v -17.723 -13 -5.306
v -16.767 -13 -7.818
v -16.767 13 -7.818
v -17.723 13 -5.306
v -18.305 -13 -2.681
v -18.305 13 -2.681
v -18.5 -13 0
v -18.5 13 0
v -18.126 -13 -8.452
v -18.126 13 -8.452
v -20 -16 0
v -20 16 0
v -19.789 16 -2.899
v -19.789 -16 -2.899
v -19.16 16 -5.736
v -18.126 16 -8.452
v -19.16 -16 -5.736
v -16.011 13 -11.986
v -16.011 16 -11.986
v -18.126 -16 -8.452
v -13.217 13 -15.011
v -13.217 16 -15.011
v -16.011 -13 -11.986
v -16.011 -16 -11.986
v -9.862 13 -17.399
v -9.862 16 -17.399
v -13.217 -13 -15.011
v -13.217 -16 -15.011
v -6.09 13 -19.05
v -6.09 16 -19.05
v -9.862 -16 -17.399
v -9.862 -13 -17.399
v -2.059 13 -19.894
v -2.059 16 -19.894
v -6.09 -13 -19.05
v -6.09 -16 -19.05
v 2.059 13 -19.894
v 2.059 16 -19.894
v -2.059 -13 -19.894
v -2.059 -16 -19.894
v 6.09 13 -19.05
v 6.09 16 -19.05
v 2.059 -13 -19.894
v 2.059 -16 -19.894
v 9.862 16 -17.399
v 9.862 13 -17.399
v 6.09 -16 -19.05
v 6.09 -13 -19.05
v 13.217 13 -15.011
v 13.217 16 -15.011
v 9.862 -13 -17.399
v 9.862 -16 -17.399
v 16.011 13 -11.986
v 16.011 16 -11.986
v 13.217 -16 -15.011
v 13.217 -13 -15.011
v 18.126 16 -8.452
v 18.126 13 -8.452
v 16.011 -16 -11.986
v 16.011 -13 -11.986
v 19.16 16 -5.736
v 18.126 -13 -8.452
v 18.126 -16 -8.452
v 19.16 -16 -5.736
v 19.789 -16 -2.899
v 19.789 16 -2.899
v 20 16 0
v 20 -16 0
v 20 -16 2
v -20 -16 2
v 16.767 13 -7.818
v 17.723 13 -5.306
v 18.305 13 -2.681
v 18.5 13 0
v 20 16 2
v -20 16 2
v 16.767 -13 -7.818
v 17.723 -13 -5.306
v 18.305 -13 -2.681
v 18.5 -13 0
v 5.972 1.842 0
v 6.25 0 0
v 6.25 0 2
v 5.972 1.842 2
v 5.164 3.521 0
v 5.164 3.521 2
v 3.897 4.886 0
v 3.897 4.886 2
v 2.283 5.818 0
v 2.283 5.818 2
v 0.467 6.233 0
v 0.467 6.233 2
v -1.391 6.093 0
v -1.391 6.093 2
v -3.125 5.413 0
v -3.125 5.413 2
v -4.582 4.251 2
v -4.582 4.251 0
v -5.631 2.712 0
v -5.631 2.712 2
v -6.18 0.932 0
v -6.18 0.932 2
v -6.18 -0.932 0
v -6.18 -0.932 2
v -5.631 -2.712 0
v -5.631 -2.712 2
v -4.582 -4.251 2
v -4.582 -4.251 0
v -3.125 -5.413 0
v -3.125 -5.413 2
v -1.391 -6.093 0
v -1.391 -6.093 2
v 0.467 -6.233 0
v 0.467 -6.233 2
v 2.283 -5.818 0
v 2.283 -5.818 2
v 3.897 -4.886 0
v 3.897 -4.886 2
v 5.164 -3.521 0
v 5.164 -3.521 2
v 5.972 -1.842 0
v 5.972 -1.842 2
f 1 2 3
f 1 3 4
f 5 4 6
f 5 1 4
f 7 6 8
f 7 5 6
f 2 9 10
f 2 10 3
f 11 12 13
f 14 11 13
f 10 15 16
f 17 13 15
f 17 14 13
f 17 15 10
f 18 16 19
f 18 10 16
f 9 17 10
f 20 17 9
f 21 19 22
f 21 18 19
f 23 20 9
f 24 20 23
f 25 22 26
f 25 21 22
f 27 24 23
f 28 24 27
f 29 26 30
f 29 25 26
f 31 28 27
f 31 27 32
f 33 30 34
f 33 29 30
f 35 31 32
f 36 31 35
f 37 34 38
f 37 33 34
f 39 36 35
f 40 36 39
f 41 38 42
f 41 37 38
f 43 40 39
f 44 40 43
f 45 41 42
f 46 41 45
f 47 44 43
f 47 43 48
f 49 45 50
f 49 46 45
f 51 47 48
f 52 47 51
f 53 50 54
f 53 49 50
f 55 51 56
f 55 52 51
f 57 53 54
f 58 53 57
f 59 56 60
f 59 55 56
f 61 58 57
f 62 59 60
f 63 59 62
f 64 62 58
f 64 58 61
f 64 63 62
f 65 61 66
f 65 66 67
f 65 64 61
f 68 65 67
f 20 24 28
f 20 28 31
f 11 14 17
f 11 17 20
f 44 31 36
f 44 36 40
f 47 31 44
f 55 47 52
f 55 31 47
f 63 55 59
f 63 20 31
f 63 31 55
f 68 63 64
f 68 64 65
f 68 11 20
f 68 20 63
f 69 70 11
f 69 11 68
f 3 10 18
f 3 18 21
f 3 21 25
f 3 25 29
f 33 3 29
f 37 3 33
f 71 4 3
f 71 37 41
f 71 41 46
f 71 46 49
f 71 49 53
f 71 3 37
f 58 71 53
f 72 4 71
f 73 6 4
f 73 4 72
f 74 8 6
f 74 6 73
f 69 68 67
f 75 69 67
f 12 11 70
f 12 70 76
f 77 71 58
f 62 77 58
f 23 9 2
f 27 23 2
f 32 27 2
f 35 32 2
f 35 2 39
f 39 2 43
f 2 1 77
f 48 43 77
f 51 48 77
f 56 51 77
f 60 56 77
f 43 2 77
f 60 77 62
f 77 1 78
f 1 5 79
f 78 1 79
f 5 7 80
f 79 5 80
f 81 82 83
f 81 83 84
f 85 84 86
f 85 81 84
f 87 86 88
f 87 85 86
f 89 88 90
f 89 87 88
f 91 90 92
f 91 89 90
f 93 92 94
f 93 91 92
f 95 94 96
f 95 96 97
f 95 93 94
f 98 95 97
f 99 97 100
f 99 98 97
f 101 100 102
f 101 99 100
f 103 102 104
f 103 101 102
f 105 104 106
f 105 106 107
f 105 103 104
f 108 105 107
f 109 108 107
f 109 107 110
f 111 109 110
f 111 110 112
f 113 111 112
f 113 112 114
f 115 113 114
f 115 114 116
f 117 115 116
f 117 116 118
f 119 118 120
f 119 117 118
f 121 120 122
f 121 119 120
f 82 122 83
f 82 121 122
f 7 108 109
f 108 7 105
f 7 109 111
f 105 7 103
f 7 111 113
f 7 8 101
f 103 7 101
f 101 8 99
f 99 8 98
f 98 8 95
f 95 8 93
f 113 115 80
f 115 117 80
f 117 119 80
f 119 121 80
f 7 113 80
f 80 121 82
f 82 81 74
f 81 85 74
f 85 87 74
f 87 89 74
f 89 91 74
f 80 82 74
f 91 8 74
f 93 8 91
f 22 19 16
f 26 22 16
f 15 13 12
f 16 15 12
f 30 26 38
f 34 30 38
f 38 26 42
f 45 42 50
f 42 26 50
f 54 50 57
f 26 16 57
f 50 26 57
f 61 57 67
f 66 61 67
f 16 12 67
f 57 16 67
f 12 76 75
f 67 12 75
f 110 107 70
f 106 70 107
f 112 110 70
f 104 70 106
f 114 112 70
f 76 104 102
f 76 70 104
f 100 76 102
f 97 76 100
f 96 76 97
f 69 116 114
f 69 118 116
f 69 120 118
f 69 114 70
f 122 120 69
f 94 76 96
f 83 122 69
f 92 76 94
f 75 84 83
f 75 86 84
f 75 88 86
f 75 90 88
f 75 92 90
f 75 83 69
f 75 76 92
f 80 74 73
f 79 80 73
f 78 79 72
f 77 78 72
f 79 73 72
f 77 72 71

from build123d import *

# Parameters (mm, degrees)
F0_W     = 40
F0_H     = 32
F0_R     = 6.25
F1_DEPTH = 2
F3_START = 13
F3_DEPTH = 3
F4_START = -13
F4_DEPTH = 3
F5_DEPTH = 16


with BuildPart() as f1:
    # F0 (on Top) → F1 (new body)
    with BuildSketch(Plane.XY):
        Rectangle(F0_W, F0_H)
        Circle(F0_R, mode=Mode.SUBTRACT)
    extrude(amount=F1_DEPTH)

    # F2 (on Front) → F3 (join)
    with BuildSketch(Plane.XZ.offset(F3_START)):
        with BuildLine():
            ThreePointArc((18.1261557407, -8.4523652348), (19.5259201424, -4.3287922788), (20, 0))
            Line((20, 0), (18.5, 0))
            ThreePointArc((18.5, 0), (18.0614761317, -4.0041328579), (16.7666940602, -7.8184378422))
            Line((16.7666940602, -7.8184378422), (18.1261557407, -8.4523652348))
        make_face()
        with BuildLine():
            Line((-18.5, 0), (-20, 0))
            ThreePointArc((-20, 0), (-19.5259201424, -4.3287922788), (-18.1261557407, -8.4523652348))
            Line((-18.1261557407, -8.4523652348), (-16.7666940602, -7.8184378422))
            ThreePointArc((-16.7666940602, -7.8184378422), (-18.0614761317, -4.0041328579), (-18.5, 0))
        make_face()
        with BuildLine():
            ThreePointArc((-18.1261557407, -8.4523652348), (0, -20), (18.1261557407, -8.4523652348))
            Line((18.1261557407, -8.4523652348), (16.7666940602, -7.8184378422))
            ThreePointArc((16.7666940602, -7.8184378422), (0, -18.5), (-16.7666940602, -7.8184378422))
            Line((-16.7666940602, -7.8184378422), (-18.1261557407, -8.4523652348))
        make_face()
        with BuildLine():
            ThreePointArc((16.7666940602, -7.8184378422), (18.0614761317, -4.0041328579), (18.5, 0))
            Line((18.5, 0), (0, 0))
            Line((0, 0), (16.7666940602, -7.8184378422))
        make_face()
        with BuildLine():
            Line((0, 0), (-18.5, 0))
            ThreePointArc((-18.5, 0), (-18.0614761317, -4.0041328579), (-16.7666940602, -7.8184378422))
            Line((-16.7666940602, -7.8184378422), (0, 0))
        make_face()
        with BuildLine():
            ThreePointArc((-16.7666940602, -7.8184378422), (0, -18.5), (16.7666940602, -7.8184378422))
            Line((16.7666940602, -7.8184378422), (0, 0))
            Line((0, 0), (-16.7666940602, -7.8184378422))
        make_face()
    extrude(amount=F3_DEPTH)

    # F2 (on Front) → F4 (join)
    with BuildSketch(Plane.XZ.offset(F4_START)):
        with BuildLine():
            ThreePointArc((18.1261557407, -8.4523652348), (19.5259201424, -4.3287922788), (20, 0))
            Line((20, 0), (18.5, 0))
            ThreePointArc((18.5, 0), (18.0614761317, -4.0041328579), (16.7666940602, -7.8184378422))
            Line((16.7666940602, -7.8184378422), (18.1261557407, -8.4523652348))
        make_face()
        with BuildLine():
            Line((-18.5, 0), (-20, 0))
            ThreePointArc((-20, 0), (-19.5259201424, -4.3287922788), (-18.1261557407, -8.4523652348))
            Line((-18.1261557407, -8.4523652348), (-16.7666940602, -7.8184378422))
            ThreePointArc((-16.7666940602, -7.8184378422), (-18.0614761317, -4.0041328579), (-18.5, 0))
        make_face()
        with BuildLine():
            ThreePointArc((-18.1261557407, -8.4523652348), (0, -20), (18.1261557407, -8.4523652348))
            Line((18.1261557407, -8.4523652348), (16.7666940602, -7.8184378422))
            ThreePointArc((16.7666940602, -7.8184378422), (0, -18.5), (-16.7666940602, -7.8184378422))
            Line((-16.7666940602, -7.8184378422), (-18.1261557407, -8.4523652348))
        make_face()
        with BuildLine():
            ThreePointArc((16.7666940602, -7.8184378422), (18.0614761317, -4.0041328579), (18.5, 0))
            Line((18.5, 0), (0, 0))
            Line((0, 0), (16.7666940602, -7.8184378422))
        make_face()
        with BuildLine():
            Line((0, 0), (-18.5, 0))
            ThreePointArc((-18.5, 0), (-18.0614761317, -4.0041328579), (-16.7666940602, -7.8184378422))
            Line((-16.7666940602, -7.8184378422), (0, 0))
        make_face()
        with BuildLine():
            ThreePointArc((-16.7666940602, -7.8184378422), (0, -18.5), (16.7666940602, -7.8184378422))
            Line((16.7666940602, -7.8184378422), (0, 0))
            Line((0, 0), (-16.7666940602, -7.8184378422))
        make_face()
    extrude(amount=-F4_DEPTH)

    # F2 (on Front) → F5 (join, symmetric)
    with BuildSketch(Plane.XZ):
        with BuildLine():
            ThreePointArc((18.1261557407, -8.4523652348), (19.5259201424, -4.3287922788), (20, 0))
            Line((20, 0), (18.5, 0))
            ThreePointArc((18.5, 0), (18.0614761317, -4.0041328579), (16.7666940602, -7.8184378422))
            Line((16.7666940602, -7.8184378422), (18.1261557407, -8.4523652348))
        make_face()
        with BuildLine():
            Line((-18.5, 0), (-20, 0))
            ThreePointArc((-20, 0), (-19.5259201424, -4.3287922788), (-18.1261557407, -8.4523652348))
            Line((-18.1261557407, -8.4523652348), (-16.7666940602, -7.8184378422))
            ThreePointArc((-16.7666940602, -7.8184378422), (-18.0614761317, -4.0041328579), (-18.5, 0))
        make_face()
    extrude(amount=F5_DEPTH, both=True)


solid = f1.part
